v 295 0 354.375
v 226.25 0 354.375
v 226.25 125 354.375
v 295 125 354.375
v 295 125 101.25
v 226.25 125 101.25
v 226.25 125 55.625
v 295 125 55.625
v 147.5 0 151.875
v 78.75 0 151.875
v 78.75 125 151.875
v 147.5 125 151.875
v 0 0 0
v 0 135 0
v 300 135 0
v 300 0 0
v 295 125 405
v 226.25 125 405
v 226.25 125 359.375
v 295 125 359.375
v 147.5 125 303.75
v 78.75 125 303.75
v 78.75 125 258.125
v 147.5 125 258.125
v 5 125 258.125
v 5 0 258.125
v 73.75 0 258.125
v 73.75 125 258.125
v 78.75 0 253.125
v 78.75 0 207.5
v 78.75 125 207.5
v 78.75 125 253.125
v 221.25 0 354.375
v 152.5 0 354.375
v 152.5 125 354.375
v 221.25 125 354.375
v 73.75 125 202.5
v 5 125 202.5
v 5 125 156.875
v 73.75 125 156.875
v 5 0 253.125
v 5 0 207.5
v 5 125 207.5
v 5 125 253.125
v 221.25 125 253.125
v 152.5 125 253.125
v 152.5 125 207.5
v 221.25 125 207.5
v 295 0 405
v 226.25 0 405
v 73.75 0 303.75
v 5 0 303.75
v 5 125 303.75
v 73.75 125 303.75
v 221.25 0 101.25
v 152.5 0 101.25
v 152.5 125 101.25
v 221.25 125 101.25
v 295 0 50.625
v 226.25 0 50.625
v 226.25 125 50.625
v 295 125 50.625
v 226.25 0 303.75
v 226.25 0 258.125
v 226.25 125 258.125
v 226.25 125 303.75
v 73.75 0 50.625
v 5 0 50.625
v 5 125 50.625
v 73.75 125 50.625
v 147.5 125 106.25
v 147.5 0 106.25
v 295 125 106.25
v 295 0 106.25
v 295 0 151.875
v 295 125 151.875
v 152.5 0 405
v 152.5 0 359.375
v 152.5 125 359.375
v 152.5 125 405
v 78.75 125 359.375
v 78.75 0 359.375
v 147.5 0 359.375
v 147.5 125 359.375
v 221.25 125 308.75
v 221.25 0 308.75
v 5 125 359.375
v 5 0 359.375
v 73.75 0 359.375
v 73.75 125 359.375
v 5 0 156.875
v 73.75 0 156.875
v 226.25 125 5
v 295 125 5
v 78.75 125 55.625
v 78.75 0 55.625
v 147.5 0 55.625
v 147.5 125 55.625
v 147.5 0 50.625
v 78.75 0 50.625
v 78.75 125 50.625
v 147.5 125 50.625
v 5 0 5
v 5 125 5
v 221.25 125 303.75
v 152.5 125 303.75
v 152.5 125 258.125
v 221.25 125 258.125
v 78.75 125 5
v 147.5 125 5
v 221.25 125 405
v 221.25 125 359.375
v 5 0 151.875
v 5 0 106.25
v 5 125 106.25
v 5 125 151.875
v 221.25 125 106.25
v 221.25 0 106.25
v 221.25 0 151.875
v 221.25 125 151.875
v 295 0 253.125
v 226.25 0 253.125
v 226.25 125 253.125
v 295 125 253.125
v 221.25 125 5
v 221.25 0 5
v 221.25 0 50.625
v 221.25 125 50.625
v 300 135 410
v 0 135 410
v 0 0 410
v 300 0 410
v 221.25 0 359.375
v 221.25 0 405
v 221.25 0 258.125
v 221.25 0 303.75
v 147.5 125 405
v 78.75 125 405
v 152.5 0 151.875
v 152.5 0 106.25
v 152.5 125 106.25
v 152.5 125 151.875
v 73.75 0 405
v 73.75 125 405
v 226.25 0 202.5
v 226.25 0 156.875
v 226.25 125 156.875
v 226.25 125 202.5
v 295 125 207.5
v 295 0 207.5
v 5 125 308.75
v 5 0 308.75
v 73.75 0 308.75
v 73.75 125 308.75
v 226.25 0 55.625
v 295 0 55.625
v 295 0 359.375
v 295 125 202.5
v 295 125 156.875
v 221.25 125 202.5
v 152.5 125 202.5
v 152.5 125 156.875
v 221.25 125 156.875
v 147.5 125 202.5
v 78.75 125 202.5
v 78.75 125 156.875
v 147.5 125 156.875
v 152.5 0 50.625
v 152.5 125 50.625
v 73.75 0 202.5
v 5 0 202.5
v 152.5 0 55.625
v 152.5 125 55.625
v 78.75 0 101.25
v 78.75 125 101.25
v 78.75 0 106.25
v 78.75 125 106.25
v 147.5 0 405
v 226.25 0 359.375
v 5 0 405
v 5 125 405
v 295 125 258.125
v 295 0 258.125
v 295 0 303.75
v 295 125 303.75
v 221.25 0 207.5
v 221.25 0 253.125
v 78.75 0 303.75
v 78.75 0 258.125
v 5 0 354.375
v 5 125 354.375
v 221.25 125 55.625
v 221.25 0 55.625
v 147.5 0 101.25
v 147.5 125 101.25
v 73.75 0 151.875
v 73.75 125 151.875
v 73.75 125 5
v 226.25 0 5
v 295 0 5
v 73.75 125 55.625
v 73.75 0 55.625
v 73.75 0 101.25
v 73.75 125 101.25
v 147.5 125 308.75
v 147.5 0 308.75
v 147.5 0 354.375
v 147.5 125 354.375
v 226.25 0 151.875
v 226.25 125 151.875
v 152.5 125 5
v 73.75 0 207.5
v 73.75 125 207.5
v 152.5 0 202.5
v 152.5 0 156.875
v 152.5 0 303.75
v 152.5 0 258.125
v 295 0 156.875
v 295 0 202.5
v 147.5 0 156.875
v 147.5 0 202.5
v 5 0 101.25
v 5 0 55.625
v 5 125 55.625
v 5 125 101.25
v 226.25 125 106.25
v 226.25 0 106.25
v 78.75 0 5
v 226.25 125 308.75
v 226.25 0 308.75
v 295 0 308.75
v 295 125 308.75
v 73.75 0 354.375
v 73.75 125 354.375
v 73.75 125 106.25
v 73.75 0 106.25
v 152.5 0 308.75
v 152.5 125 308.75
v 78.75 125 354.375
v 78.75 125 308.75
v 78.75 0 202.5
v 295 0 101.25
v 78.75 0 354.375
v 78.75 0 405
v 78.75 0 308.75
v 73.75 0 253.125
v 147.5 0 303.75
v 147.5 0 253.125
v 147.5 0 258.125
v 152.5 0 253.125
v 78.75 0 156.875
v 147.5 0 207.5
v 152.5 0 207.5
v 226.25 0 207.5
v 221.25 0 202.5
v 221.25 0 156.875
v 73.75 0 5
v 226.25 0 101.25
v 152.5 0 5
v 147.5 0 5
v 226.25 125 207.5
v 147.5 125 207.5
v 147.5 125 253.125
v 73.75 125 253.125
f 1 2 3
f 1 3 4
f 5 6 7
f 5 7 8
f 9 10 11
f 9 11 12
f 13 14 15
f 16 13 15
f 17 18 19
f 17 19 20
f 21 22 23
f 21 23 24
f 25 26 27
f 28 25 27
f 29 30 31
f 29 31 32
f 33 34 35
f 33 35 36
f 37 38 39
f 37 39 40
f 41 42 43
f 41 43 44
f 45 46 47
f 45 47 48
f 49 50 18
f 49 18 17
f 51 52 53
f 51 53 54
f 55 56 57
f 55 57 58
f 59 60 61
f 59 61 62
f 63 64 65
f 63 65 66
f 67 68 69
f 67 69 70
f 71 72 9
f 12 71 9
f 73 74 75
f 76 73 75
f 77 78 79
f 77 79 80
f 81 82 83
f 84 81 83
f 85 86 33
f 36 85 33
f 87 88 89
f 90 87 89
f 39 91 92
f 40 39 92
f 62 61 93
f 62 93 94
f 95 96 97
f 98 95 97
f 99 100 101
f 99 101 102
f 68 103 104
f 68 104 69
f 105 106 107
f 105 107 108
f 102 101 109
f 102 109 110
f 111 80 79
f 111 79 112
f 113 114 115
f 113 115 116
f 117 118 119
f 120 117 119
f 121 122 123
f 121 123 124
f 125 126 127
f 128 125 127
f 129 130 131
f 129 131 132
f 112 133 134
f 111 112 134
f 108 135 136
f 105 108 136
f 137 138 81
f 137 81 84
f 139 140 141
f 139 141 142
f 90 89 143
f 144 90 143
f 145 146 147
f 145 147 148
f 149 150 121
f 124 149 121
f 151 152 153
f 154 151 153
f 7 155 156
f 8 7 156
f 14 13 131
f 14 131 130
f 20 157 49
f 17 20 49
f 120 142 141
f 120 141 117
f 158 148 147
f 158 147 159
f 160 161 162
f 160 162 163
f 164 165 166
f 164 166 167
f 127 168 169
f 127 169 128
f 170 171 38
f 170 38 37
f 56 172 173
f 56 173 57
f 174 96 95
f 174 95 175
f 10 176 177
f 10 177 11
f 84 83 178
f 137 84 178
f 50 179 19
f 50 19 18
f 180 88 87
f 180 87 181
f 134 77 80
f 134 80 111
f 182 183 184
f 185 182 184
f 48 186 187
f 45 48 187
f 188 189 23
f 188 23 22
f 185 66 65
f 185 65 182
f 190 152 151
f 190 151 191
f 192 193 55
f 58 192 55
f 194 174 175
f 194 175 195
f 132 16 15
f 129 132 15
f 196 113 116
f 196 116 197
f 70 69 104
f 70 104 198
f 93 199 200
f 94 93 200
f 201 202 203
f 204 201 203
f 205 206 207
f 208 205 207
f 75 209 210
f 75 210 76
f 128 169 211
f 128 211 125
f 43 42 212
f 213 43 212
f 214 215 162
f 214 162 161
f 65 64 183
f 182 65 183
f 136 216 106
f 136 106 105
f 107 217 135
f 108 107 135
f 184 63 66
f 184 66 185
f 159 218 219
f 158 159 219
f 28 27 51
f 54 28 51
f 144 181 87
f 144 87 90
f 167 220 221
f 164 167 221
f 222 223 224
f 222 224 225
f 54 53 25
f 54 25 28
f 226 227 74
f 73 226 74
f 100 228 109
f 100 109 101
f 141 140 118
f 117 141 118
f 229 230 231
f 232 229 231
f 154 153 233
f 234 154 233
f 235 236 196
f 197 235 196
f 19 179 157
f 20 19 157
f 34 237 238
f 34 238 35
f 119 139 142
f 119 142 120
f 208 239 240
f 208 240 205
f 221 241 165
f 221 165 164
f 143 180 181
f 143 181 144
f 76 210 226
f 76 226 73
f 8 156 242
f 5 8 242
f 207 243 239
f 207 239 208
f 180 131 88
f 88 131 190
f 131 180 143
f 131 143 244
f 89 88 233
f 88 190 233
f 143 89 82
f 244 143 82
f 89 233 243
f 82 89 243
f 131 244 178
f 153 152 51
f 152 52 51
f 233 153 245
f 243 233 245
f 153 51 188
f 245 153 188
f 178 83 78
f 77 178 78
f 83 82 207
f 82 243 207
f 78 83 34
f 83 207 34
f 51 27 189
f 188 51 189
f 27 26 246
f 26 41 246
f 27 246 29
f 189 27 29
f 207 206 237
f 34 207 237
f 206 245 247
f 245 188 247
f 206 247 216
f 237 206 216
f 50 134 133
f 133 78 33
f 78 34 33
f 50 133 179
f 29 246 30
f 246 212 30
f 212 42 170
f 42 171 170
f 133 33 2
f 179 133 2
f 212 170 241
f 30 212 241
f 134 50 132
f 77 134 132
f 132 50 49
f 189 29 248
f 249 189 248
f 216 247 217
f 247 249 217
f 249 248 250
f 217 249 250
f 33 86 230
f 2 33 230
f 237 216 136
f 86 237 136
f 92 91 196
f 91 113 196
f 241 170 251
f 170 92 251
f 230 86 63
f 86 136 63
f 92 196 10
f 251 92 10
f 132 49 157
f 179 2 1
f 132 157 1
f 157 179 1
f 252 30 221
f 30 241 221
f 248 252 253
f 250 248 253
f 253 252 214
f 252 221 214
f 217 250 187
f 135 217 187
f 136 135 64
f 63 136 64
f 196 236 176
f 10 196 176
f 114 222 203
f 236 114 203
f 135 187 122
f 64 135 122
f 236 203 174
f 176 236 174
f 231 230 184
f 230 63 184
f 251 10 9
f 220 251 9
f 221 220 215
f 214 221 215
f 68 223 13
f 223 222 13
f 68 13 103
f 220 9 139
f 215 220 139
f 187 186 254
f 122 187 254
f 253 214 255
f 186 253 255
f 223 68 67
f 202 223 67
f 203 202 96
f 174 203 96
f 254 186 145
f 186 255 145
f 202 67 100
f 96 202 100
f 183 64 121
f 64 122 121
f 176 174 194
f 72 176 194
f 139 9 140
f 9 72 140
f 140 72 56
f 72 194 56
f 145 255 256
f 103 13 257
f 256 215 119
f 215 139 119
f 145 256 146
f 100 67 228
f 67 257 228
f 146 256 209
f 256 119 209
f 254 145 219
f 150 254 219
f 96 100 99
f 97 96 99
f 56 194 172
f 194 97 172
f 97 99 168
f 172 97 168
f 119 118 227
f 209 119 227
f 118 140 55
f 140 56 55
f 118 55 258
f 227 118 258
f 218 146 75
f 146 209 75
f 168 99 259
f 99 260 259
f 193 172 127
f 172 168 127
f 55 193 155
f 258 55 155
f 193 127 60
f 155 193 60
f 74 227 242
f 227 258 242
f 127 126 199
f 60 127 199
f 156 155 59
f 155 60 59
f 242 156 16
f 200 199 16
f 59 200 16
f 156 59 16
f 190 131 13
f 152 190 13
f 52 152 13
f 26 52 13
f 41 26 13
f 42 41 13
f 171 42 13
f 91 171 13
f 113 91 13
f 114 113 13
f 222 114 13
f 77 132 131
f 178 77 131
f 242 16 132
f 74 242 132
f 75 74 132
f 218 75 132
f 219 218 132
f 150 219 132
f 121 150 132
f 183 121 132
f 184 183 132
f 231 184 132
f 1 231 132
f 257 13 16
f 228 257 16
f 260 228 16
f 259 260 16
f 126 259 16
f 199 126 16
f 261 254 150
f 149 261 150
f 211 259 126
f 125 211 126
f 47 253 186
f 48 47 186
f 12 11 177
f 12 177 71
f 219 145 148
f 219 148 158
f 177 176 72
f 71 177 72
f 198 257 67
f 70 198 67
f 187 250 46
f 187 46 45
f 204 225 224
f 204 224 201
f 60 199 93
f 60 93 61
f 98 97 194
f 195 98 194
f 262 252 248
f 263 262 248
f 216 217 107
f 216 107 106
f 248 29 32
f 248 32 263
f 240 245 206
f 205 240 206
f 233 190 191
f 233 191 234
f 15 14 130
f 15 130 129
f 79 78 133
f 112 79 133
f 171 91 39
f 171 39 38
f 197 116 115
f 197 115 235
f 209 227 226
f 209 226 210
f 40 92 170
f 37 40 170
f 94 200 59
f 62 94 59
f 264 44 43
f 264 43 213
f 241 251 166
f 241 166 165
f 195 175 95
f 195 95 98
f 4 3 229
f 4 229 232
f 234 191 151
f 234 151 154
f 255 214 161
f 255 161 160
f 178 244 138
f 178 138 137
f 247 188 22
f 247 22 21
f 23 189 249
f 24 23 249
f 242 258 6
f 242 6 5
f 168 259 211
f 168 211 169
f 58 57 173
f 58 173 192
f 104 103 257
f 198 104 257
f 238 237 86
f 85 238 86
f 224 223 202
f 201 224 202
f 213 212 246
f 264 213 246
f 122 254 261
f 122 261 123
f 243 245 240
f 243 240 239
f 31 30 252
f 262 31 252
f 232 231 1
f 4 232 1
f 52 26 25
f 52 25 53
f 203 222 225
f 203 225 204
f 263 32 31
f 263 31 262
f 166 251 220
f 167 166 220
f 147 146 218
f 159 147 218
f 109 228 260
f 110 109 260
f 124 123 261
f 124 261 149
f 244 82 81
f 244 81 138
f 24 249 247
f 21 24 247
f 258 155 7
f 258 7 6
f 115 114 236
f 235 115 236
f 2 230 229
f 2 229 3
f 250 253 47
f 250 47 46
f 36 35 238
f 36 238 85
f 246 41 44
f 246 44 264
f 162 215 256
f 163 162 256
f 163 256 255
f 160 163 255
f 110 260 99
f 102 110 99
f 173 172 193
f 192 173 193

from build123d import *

# Parameters (mm, degrees)
F0_W     = 300
F0_H     = 135
F1_DEPTH = 410
F2_W     = 68.75
F2_H     = 45.625
F3_DEPTH = 125


with BuildPart() as f1:
    # F0 (on Top) → F1 (new body)
    with BuildSketch(Plane.XY):
        with Locations((150, 67.5)):
            Rectangle(F0_W, F0_H)
    extrude(amount=F1_DEPTH)

    # F2 (on face) → F3 (cut)
    with BuildSketch(Plane.XZ):
        with Locations((260.625, 230.3125)):
            Rectangle(F2_W, F2_H)
        with Locations((260.625, 280.9375)):
            Rectangle(F2_W, F2_H)
        with Locations((260.625, 331.5625)):
            Rectangle(F2_W, F2_H)
        with Locations((260.625, 382.1875)):
            Rectangle(F2_W, F2_H)
        with Locations((186.875, 382.1875)):
            Rectangle(F2_W, F2_H)
        with Locations((113.125, 382.1875)):
            Rectangle(F2_W, F2_H)
        with Locations((260.625, 179.6875)):
            Rectangle(F2_W, F2_H)
        with Locations((260.625, 129.0625)):
            Rectangle(F2_W, F2_H)
        with Locations((260.625, 78.4375)):
            Rectangle(F2_W, F2_H)
        with Locations((260.625, 27.8125)):
            Rectangle(F2_W, F2_H)
        with Locations((186.875, 27.8125)):
            Rectangle(F2_W, F2_H)
        with Locations((113.125, 27.8125)):
            Rectangle(F2_W, F2_H)
        with Locations((39.375, 27.8125)):
            Rectangle(F2_W, F2_H)
        with Locations((39.375, 78.4375)):
            Rectangle(F2_W, F2_H)
        with Locations((39.375, 129.0625)):
            Rectangle(F2_W, F2_H)
        with Locations((39.375, 179.6875)):
            Rectangle(F2_W, F2_H)
        with Locations((39.375, 230.3125)):
            Rectangle(F2_W, F2_H)
        with Locations((39.375, 280.9375)):
            Rectangle(F2_W, F2_H)
        with Locations((39.375, 331.5625)):
            Rectangle(F2_W, F2_H)
        with Locations((39.375, 382.1875)):
            Rectangle(F2_W, F2_H)
        with Locations((113.125, 331.5625)):
            Rectangle(F2_W, F2_H)
        with Locations((113.125, 280.9375)):
            Rectangle(F2_W, F2_H)
        with Locations((113.125, 230.3125)):
            Rectangle(F2_W, F2_H)
        with Locations((186.875, 331.5625)):
            Rectangle(F2_W, F2_H)
        with Locations((186.875, 280.9375)):
            Rectangle(F2_W, F2_H)
        with Locations((186.875, 230.3125)):
            Rectangle(F2_W, F2_H)
        with Locations((186.875, 78.4375)):
            Rectangle(F2_W, F2_H)
        with Locations((113.125, 78.4375)):
            Rectangle(F2_W, F2_H)
        with Locations((113.125, 129.0625)):
            Rectangle(F2_W, F2_H)
        with Locations((186.875, 129.0625)):
            Rectangle(F2_W, F2_H)
        with Locations((113.125, 179.6875)):
            Rectangle(F2_W, F2_H)
        with Locations((186.875, 179.6875)):
            Rectangle(F2_W, F2_H)
    extrude(amount=-F3_DEPTH, mode=Mode.SUBTRACT)


solid = f1.part
